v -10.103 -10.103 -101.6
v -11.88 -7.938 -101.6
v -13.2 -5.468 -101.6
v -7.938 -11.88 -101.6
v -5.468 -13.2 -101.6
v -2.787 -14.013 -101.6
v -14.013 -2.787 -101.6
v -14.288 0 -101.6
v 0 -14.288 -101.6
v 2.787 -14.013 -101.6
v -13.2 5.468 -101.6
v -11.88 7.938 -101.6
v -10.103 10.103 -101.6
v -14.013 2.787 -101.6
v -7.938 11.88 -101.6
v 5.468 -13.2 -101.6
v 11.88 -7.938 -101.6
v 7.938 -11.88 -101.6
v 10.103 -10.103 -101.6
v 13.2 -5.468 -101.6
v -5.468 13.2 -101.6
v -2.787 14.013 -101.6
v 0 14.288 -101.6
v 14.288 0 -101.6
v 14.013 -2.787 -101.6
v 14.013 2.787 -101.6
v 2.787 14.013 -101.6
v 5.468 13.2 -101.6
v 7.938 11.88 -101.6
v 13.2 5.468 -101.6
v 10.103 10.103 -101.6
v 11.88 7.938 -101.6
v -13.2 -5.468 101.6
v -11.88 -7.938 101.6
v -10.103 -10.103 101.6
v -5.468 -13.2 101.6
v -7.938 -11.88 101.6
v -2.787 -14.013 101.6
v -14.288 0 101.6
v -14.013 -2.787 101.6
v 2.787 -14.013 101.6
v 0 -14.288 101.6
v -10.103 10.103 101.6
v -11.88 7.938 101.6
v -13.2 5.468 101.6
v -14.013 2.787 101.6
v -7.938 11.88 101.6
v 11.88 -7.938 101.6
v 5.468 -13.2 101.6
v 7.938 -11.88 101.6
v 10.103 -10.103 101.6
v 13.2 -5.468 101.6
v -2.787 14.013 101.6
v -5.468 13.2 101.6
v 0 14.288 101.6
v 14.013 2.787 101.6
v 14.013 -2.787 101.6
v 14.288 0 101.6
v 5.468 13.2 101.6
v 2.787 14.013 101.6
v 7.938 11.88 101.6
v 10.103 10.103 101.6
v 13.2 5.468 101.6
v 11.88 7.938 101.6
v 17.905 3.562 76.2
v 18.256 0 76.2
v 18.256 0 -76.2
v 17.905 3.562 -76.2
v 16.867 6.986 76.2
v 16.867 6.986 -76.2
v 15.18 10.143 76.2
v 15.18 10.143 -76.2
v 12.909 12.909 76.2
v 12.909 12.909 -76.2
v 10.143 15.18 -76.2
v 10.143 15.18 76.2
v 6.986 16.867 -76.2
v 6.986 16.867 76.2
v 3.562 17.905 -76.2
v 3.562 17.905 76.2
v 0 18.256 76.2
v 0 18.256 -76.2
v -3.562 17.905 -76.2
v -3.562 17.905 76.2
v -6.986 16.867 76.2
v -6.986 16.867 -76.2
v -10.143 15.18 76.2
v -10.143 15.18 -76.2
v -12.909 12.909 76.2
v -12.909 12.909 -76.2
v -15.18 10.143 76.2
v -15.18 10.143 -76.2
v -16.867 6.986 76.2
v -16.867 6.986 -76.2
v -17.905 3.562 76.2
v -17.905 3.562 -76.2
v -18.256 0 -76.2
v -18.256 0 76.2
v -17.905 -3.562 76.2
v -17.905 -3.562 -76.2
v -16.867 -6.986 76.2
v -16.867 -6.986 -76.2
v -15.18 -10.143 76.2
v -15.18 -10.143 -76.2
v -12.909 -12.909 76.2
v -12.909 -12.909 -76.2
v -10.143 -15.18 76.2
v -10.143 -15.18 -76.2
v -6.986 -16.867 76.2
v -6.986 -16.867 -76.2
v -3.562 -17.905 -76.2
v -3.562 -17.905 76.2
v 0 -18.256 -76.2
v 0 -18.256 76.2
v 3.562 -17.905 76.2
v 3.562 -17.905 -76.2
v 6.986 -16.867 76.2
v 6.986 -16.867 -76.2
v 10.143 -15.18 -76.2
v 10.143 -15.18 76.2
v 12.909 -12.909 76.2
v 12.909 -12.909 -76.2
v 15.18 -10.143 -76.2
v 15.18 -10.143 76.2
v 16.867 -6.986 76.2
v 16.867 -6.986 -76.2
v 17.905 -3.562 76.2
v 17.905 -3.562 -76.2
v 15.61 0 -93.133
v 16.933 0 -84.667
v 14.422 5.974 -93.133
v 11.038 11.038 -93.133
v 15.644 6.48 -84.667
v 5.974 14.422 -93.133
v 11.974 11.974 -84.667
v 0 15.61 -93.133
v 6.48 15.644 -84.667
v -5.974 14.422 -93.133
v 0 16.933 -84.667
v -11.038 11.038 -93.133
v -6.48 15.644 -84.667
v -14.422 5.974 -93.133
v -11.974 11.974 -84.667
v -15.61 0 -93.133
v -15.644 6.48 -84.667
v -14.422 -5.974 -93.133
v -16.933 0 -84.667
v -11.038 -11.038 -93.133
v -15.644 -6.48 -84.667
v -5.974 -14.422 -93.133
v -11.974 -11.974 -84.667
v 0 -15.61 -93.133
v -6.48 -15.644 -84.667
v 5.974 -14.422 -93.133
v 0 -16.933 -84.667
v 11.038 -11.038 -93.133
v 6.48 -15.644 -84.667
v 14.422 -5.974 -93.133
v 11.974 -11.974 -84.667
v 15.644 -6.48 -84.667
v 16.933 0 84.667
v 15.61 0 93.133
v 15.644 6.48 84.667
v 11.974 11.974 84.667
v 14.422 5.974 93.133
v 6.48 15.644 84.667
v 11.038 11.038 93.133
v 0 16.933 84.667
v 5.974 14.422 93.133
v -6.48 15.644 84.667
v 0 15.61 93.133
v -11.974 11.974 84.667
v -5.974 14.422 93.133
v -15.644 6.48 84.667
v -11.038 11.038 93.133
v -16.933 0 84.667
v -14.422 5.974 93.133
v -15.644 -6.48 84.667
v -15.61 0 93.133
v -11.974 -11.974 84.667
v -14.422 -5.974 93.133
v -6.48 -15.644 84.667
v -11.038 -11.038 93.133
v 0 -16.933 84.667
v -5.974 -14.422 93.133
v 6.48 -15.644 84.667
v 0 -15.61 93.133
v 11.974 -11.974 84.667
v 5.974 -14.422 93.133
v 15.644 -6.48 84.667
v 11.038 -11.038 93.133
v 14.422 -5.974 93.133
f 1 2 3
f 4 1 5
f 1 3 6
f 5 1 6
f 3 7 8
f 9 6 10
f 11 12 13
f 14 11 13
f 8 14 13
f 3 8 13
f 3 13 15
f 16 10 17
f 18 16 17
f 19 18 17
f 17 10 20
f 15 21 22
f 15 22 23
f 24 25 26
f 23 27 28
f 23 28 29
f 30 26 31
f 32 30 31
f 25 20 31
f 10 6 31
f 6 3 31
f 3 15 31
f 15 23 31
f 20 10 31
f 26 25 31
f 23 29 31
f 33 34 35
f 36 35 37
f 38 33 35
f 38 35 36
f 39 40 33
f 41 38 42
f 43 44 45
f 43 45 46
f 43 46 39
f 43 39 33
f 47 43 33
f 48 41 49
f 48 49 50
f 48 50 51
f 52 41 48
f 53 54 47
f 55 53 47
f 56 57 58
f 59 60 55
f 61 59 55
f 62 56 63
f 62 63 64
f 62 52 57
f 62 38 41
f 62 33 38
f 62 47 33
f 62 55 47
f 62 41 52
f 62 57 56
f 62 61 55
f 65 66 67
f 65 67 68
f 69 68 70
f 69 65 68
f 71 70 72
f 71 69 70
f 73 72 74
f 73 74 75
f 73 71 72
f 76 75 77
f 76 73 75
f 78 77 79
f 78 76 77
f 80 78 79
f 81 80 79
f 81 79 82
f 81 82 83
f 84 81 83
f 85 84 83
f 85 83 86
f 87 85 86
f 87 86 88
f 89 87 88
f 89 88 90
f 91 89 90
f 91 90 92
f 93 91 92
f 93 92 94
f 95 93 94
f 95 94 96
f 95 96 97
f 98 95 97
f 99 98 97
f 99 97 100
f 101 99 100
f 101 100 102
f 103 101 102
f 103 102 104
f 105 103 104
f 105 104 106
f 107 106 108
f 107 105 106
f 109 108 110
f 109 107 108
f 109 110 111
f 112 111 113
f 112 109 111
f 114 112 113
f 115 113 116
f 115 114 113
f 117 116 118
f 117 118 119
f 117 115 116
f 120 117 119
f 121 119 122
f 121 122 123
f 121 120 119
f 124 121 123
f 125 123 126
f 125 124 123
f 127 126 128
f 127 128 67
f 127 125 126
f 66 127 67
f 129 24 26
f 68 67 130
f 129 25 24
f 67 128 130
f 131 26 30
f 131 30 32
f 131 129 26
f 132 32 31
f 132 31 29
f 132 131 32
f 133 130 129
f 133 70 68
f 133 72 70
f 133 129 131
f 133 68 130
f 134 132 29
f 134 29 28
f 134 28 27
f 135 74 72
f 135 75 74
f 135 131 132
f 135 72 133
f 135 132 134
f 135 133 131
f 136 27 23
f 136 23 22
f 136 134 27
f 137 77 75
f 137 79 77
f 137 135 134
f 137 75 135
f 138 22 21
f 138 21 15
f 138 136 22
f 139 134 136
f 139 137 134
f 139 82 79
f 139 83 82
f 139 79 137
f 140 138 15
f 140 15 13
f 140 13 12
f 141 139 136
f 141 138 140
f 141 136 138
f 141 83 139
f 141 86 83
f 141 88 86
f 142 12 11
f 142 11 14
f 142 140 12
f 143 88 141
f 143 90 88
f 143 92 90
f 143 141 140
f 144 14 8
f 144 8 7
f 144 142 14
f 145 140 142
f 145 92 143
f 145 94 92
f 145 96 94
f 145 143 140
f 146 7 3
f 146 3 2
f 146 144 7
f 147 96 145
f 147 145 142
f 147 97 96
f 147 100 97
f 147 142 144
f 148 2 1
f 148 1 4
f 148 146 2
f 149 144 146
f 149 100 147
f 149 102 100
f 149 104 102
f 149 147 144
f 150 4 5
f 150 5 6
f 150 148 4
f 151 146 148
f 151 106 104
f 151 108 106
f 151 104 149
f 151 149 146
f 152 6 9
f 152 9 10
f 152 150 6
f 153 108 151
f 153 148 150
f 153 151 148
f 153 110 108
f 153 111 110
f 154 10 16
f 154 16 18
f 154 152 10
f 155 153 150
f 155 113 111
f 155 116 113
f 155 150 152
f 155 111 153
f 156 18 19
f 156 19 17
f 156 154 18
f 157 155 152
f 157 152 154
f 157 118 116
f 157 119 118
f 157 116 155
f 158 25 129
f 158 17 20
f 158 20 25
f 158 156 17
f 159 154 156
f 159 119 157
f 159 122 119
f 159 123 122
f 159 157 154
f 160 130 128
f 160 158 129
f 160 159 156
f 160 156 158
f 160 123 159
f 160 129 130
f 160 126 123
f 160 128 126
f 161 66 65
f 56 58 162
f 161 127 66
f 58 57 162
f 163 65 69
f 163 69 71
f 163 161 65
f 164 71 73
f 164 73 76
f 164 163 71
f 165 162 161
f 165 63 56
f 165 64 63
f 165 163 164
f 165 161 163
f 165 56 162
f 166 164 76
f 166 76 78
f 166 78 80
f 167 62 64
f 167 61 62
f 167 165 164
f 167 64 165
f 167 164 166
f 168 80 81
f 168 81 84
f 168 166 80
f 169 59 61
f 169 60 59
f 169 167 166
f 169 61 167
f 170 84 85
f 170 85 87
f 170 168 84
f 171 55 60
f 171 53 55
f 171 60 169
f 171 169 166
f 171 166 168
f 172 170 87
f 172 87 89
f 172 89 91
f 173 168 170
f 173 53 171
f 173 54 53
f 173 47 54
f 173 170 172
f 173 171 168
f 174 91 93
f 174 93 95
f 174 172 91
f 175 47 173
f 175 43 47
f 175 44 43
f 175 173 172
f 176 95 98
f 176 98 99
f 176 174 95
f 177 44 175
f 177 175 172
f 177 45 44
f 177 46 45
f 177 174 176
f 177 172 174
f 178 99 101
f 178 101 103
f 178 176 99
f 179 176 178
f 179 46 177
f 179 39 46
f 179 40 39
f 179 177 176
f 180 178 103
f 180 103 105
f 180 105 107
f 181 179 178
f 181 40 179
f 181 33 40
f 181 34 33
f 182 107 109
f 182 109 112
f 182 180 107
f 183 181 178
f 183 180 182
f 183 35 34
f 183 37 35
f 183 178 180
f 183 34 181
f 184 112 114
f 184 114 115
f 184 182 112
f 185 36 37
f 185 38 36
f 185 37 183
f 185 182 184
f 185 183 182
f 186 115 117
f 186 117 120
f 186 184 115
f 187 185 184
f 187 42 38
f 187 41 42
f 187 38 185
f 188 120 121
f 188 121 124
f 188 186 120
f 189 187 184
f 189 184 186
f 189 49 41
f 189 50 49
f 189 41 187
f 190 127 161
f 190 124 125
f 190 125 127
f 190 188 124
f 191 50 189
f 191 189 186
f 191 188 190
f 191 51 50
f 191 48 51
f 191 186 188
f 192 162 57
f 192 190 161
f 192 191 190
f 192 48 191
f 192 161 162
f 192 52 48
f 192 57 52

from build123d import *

# Parameters (mm, degrees)
SKETCH1_R           = 18.25625
BOSS_EXTRUDE1_DEPTH = 101.6
CHAMFER1_SIZE       = 25.4
CHAMFER1_SIZE2      = 3.96875
CHAMFER2_SIZE       = 3.96875
CHAMFER2_SIZE2      = 25.4


with BuildPart() as part:
    # Sketch1 → Boss-Extrude1 (new body, symmetric)
    with BuildSketch(Plane.XY):
        Circle(SKETCH1_R)
    extrude(amount=BOSS_EXTRUDE1_DEPTH, both=True)

    # Chamfer1
    chamfer1_edges = [part.edges().sort_by_distance(p)[0] for p in [
        (-18.25625, 0, 101.6),
    ]]
    chamfer1_side = [part.faces().sort_by_distance(p)[0] for p in [
        (-18.25625, 0, 0),
    ]]
    chamfer(chamfer1_edges, length=CHAMFER1_SIZE, length2=CHAMFER1_SIZE2, reference=chamfer1_side[0])

    # Chamfer2
    chamfer2_edges = [part.edges().sort_by_distance(p)[0] for p in [
        (-18.25625, 0, -101.6),
    ]]
    chamfer2_side = [part.faces().sort_by_distance(p)[0] for p in [
        (0, 0, -101.6),
    ]]
    chamfer(chamfer2_edges, length=CHAMFER2_SIZE, length2=CHAMFER2_SIZE2, reference=chamfer2_side[0])


solid = part.part
